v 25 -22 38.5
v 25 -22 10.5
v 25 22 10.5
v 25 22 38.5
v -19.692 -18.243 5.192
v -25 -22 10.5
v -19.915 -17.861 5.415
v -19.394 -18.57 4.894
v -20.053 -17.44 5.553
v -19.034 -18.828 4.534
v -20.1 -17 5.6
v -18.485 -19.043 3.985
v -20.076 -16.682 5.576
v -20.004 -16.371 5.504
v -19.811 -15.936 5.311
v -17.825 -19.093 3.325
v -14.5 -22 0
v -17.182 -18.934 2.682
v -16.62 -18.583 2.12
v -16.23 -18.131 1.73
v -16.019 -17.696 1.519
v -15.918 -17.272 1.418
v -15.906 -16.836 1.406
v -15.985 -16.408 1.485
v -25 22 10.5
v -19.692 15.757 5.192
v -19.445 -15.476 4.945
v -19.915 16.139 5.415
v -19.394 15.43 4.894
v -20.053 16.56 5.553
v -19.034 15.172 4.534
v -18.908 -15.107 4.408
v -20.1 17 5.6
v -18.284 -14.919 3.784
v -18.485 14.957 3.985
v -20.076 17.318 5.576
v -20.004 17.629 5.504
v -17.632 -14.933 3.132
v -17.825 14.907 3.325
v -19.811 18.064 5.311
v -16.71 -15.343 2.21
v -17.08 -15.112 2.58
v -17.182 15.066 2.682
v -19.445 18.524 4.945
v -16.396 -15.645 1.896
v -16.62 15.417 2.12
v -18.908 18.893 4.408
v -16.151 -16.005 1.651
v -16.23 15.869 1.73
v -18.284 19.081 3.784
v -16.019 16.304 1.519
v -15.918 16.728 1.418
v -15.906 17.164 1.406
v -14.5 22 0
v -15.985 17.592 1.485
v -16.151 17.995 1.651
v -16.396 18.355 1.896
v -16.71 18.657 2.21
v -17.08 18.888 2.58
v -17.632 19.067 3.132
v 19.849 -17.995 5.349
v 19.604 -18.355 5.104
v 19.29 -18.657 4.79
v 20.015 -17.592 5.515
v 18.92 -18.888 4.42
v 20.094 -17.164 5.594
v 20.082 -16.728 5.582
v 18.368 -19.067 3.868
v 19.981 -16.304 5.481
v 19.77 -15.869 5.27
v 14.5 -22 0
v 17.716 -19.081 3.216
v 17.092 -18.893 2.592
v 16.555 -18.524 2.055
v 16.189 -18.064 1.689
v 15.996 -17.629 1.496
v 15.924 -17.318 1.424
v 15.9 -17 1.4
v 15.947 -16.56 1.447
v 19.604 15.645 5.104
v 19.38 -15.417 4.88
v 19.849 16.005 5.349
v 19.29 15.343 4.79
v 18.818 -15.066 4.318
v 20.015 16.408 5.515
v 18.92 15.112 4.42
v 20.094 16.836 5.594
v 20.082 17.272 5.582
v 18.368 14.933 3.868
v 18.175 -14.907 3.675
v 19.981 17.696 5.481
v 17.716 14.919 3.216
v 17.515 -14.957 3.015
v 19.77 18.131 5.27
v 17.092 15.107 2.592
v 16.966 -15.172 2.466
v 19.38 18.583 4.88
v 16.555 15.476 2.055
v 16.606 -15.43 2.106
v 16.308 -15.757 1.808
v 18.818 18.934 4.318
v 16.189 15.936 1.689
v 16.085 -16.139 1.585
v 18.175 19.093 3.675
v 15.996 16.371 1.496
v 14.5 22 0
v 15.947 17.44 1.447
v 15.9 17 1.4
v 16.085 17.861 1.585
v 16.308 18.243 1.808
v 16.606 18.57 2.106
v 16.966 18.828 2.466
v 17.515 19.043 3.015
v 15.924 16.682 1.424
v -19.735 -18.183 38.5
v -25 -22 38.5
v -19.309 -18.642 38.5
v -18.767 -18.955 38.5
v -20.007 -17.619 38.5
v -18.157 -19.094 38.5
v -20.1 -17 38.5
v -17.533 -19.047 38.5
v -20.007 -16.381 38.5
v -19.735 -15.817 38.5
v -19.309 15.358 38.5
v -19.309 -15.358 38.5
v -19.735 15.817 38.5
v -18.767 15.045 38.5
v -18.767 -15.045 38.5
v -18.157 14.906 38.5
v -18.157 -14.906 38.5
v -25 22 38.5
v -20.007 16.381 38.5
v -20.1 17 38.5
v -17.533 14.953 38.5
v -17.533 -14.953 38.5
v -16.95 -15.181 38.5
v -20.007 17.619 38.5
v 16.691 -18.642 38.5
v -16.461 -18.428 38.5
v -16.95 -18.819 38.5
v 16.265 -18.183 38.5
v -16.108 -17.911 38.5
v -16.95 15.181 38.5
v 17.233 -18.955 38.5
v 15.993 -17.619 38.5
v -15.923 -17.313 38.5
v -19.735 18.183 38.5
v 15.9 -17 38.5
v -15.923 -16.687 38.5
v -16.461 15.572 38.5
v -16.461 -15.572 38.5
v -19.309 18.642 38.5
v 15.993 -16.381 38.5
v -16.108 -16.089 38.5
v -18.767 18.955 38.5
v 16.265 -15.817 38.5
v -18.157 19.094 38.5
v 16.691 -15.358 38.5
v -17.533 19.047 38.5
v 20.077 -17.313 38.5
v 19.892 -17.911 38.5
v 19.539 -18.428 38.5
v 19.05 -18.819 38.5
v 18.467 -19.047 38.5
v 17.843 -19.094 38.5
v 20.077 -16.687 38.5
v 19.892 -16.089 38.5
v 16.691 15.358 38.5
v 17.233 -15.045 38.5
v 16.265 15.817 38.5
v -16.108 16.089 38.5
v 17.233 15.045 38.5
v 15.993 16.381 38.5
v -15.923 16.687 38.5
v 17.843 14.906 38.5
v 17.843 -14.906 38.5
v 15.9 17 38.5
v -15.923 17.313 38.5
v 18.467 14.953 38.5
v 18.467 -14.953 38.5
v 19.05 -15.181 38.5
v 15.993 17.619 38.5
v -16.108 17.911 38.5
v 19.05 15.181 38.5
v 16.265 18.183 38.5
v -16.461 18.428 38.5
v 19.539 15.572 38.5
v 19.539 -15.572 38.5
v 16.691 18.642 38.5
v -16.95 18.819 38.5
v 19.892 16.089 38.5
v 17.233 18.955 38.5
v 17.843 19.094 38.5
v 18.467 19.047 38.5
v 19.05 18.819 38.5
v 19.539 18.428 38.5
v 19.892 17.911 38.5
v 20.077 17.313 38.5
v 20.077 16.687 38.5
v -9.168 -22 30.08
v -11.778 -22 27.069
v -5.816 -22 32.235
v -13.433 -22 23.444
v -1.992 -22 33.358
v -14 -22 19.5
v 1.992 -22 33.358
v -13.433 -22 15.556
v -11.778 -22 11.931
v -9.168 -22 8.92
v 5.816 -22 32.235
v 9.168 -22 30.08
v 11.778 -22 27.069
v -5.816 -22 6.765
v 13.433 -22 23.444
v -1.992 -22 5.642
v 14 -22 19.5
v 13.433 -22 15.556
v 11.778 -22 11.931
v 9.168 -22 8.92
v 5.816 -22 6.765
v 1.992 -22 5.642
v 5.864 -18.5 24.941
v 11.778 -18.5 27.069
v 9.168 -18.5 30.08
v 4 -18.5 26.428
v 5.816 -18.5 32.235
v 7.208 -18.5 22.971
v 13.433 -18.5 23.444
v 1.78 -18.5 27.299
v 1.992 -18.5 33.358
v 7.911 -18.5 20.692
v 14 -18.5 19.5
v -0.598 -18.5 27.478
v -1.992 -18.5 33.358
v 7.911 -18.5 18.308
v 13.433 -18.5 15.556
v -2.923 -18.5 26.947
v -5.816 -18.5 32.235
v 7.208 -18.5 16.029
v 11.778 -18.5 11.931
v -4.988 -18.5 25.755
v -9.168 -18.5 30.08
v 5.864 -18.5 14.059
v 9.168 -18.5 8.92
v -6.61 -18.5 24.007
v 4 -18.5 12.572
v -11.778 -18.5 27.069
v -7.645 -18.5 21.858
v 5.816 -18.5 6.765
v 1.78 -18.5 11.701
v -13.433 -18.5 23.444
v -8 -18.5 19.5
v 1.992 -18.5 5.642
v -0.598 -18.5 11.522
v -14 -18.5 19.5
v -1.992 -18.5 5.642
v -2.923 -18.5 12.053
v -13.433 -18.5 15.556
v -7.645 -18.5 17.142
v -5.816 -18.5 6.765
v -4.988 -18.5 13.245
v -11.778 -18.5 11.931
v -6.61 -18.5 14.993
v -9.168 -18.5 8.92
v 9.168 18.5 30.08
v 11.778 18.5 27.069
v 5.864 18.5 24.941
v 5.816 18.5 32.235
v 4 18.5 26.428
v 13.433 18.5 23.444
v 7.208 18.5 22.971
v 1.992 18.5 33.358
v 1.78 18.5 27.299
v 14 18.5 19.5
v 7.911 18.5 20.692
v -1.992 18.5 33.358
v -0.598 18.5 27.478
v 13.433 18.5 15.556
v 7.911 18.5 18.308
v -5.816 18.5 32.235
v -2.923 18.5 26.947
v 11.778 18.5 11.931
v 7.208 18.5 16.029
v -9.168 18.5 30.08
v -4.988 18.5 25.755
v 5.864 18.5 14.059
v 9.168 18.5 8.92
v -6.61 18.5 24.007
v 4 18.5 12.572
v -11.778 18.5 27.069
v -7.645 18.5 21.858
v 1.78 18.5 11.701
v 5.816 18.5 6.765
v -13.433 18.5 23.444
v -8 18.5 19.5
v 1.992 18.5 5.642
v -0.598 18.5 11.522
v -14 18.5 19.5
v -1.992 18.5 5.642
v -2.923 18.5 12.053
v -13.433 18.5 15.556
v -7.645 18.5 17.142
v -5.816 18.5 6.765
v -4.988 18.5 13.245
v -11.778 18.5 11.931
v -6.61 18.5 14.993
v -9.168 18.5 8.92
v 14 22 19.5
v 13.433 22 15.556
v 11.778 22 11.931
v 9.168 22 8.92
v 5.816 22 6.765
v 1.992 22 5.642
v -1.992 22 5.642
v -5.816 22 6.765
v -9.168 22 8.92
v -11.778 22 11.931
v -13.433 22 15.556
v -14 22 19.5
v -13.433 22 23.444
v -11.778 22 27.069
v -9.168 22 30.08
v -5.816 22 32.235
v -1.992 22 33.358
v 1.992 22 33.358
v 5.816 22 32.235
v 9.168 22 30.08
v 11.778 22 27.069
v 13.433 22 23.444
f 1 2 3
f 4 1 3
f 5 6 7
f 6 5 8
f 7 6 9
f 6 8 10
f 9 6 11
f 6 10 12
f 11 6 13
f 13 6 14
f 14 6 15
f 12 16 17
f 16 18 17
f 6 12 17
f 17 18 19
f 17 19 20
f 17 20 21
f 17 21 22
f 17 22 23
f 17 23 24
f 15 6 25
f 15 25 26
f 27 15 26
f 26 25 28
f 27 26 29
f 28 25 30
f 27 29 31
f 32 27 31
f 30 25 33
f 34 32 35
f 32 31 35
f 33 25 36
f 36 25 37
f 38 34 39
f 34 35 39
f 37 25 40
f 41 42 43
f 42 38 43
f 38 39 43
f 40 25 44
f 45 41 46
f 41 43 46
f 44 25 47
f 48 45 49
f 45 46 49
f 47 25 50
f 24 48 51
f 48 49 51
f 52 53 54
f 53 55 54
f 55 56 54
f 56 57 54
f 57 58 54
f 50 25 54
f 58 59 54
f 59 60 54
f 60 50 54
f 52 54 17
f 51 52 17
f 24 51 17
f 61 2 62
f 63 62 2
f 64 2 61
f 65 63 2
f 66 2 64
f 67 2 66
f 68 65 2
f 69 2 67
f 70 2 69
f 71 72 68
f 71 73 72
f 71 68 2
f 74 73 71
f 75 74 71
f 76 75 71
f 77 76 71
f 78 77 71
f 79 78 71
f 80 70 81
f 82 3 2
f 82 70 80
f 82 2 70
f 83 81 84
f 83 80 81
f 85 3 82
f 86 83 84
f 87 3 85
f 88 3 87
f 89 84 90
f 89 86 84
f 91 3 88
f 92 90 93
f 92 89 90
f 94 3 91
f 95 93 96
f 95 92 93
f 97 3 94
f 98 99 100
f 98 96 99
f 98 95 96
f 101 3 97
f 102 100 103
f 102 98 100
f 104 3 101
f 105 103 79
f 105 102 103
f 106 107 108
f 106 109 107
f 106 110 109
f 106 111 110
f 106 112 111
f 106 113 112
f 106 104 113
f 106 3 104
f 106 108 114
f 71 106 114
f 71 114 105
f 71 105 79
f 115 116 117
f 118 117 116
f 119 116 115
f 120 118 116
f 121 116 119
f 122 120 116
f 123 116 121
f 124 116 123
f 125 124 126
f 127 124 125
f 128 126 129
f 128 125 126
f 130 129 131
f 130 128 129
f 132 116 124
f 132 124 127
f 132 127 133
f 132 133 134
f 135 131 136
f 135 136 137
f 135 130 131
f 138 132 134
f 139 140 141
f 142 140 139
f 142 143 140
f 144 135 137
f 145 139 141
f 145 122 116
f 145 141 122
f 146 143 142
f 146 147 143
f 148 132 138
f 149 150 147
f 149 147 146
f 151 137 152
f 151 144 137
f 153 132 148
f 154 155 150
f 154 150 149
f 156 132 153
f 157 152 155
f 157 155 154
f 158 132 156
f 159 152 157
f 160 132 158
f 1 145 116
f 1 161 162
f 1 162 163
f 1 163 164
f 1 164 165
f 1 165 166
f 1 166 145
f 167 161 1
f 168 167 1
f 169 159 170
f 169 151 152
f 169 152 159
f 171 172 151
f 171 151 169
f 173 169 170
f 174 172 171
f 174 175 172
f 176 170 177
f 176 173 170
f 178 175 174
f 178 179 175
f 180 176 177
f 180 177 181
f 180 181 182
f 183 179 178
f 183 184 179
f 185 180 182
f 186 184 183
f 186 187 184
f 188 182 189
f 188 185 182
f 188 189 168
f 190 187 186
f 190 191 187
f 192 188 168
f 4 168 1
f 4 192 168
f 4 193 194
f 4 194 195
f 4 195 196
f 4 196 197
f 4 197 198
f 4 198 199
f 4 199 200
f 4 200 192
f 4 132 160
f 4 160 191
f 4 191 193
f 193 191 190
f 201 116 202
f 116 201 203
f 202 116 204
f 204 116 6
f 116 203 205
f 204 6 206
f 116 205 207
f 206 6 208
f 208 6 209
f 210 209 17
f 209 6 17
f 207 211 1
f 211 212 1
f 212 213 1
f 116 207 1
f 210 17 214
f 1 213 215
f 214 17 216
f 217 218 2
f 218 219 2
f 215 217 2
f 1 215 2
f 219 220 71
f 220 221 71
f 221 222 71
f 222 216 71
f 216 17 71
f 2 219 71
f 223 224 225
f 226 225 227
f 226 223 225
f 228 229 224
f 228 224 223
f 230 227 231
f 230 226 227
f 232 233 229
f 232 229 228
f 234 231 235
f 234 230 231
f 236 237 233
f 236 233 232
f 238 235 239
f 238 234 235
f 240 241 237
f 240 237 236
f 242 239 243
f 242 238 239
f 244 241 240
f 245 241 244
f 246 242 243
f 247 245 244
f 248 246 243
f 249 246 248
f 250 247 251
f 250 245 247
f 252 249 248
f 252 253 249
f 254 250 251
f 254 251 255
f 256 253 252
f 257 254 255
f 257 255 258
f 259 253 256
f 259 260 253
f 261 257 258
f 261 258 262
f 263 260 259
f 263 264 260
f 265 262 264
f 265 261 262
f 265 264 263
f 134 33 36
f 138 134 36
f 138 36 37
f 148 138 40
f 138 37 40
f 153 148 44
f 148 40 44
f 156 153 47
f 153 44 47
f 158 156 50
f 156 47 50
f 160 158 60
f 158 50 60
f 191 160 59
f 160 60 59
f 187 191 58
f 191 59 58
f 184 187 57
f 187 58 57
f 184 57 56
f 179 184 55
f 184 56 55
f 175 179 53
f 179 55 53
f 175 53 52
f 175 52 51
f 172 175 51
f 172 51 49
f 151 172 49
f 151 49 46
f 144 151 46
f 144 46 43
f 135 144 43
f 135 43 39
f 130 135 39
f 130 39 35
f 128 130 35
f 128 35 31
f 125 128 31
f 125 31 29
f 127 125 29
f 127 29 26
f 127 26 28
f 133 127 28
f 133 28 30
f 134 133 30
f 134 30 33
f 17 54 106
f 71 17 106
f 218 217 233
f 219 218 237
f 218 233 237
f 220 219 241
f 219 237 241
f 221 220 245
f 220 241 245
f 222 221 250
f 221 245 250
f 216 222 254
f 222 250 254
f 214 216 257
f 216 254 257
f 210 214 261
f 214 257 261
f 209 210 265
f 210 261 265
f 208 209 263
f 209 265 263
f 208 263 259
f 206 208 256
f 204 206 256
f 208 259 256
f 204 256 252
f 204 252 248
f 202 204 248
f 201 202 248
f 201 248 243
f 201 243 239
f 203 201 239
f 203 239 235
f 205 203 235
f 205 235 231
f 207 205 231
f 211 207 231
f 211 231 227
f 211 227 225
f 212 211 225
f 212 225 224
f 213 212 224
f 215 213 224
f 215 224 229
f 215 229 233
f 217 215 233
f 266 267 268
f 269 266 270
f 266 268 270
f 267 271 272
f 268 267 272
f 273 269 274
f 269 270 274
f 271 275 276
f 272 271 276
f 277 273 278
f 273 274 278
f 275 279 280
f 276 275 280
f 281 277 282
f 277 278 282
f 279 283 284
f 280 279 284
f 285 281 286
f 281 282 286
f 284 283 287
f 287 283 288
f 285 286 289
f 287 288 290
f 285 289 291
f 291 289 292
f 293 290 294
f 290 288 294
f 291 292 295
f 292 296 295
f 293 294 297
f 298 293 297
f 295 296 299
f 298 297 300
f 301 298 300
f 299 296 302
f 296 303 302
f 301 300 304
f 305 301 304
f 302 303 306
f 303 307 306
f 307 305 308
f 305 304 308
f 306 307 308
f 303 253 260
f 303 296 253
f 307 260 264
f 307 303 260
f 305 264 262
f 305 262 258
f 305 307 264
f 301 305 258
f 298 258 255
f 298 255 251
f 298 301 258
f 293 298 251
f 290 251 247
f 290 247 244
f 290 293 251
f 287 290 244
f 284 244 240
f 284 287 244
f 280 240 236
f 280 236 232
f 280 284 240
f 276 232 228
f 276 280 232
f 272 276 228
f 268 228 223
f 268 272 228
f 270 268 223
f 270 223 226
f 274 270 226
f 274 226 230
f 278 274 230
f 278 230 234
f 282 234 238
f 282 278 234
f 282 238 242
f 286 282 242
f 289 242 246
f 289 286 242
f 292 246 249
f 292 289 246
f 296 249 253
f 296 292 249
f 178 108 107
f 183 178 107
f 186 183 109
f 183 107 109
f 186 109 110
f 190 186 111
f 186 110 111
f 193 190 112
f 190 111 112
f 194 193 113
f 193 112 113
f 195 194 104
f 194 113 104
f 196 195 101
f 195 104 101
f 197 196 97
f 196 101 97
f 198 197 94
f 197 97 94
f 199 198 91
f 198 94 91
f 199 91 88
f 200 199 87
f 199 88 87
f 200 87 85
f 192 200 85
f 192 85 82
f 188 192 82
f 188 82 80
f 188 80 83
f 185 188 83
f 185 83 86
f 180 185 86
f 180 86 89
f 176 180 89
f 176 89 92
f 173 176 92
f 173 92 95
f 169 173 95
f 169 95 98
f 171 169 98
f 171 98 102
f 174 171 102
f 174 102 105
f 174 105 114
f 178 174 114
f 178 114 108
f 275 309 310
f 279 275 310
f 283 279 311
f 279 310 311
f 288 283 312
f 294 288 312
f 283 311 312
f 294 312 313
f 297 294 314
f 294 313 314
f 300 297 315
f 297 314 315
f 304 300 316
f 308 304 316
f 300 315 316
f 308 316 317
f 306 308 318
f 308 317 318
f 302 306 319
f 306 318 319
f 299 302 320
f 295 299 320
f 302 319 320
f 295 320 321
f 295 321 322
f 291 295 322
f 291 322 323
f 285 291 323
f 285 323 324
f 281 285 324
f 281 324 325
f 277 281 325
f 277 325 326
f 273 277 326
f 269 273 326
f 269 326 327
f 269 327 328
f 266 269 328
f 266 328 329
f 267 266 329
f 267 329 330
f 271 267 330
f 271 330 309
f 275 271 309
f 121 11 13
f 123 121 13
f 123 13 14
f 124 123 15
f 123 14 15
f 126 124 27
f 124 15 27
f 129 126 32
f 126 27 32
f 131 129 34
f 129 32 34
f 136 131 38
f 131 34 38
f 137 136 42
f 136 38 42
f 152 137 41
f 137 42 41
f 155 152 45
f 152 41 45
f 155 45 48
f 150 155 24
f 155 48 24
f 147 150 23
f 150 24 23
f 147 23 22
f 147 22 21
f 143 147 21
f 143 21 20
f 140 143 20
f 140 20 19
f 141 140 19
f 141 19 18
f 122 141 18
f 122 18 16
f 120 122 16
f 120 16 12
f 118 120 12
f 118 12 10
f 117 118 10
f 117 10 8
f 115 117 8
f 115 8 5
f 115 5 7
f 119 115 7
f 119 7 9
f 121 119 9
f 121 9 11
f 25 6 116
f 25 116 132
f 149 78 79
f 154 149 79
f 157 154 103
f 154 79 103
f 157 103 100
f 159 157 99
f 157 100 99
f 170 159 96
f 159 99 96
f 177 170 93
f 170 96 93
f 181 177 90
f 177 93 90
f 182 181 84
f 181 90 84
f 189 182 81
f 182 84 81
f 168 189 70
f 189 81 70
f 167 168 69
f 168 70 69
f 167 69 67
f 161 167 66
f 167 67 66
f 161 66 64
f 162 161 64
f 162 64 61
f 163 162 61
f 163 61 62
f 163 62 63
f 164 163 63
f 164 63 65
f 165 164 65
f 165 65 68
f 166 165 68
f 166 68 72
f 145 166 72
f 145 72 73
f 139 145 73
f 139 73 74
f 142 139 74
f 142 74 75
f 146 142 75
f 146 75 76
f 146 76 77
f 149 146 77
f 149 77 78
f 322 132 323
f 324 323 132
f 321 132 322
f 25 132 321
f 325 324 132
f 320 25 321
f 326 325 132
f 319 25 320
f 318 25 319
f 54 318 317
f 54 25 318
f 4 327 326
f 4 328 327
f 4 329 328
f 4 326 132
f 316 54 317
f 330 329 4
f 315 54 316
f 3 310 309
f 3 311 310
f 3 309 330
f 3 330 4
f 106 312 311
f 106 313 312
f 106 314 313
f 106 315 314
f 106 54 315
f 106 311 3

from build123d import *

# Parameters (mm, degrees)
SKETCH1_W           = 50
SKETCH1_H           = 44
BOSS_EXTRUDE1_DEPTH = 38.5
M5_TAPPED_HOLE1_D   = 4.2
SKETCH6_R           = 14
CUT_EXTRUDE1_DEPTH  = 45
SKETCH8_R           = 14
SKETCH8_R_2         = 8
BOSS_EXTRUDE2_DEPTH = 18.5


with BuildPart() as part:
    # Sketch1 → Boss-Extrude1 (new body)
    with BuildSketch(Plane.XY):
        Rectangle(SKETCH1_W, SKETCH1_H)
    extrude(amount=BOSS_EXTRUDE1_DEPTH)

    # M5 Tapped Hole1 (through all)
    with Locations(Plane.XY.offset(38.5)):
        with Locations((-18, 17), (18, 17), (18, -17), (-18, -17)):
            Hole(M5_TAPPED_HOLE1_D / 2)

    # Sketch6 → Cut-Extrude1 (cut, through all)
    with BuildSketch(Plane(origin=(0, 22, 0), x_dir=(1, 0, 0), z_dir=(0, 1, 0))):
        with Locations((0, -19.5)):
            Circle(SKETCH6_R)
        Polygon((-25, -10.5), (-14.5, 0), (-25, 0), align=None)
        Polygon((25, -10.5), (14.5, 0), (25, 0), align=None)
    extrude(amount=-CUT_EXTRUDE1_DEPTH, mode=Mode.SUBTRACT)

    # Sketch8 → Boss-Extrude2 (add, symmetric)
    with BuildSketch(Plane(origin=(0, 0, 0), x_dir=(-1, 0, 0), z_dir=(0, -1, 0))):
        with Locations((0, -19.5)):
            Circle(SKETCH8_R)
        with Locations((0, -19.5)):
            Circle(SKETCH8_R_2, mode=Mode.SUBTRACT)
    extrude(amount=BOSS_EXTRUDE2_DEPTH, both=True)


solid = part.part
